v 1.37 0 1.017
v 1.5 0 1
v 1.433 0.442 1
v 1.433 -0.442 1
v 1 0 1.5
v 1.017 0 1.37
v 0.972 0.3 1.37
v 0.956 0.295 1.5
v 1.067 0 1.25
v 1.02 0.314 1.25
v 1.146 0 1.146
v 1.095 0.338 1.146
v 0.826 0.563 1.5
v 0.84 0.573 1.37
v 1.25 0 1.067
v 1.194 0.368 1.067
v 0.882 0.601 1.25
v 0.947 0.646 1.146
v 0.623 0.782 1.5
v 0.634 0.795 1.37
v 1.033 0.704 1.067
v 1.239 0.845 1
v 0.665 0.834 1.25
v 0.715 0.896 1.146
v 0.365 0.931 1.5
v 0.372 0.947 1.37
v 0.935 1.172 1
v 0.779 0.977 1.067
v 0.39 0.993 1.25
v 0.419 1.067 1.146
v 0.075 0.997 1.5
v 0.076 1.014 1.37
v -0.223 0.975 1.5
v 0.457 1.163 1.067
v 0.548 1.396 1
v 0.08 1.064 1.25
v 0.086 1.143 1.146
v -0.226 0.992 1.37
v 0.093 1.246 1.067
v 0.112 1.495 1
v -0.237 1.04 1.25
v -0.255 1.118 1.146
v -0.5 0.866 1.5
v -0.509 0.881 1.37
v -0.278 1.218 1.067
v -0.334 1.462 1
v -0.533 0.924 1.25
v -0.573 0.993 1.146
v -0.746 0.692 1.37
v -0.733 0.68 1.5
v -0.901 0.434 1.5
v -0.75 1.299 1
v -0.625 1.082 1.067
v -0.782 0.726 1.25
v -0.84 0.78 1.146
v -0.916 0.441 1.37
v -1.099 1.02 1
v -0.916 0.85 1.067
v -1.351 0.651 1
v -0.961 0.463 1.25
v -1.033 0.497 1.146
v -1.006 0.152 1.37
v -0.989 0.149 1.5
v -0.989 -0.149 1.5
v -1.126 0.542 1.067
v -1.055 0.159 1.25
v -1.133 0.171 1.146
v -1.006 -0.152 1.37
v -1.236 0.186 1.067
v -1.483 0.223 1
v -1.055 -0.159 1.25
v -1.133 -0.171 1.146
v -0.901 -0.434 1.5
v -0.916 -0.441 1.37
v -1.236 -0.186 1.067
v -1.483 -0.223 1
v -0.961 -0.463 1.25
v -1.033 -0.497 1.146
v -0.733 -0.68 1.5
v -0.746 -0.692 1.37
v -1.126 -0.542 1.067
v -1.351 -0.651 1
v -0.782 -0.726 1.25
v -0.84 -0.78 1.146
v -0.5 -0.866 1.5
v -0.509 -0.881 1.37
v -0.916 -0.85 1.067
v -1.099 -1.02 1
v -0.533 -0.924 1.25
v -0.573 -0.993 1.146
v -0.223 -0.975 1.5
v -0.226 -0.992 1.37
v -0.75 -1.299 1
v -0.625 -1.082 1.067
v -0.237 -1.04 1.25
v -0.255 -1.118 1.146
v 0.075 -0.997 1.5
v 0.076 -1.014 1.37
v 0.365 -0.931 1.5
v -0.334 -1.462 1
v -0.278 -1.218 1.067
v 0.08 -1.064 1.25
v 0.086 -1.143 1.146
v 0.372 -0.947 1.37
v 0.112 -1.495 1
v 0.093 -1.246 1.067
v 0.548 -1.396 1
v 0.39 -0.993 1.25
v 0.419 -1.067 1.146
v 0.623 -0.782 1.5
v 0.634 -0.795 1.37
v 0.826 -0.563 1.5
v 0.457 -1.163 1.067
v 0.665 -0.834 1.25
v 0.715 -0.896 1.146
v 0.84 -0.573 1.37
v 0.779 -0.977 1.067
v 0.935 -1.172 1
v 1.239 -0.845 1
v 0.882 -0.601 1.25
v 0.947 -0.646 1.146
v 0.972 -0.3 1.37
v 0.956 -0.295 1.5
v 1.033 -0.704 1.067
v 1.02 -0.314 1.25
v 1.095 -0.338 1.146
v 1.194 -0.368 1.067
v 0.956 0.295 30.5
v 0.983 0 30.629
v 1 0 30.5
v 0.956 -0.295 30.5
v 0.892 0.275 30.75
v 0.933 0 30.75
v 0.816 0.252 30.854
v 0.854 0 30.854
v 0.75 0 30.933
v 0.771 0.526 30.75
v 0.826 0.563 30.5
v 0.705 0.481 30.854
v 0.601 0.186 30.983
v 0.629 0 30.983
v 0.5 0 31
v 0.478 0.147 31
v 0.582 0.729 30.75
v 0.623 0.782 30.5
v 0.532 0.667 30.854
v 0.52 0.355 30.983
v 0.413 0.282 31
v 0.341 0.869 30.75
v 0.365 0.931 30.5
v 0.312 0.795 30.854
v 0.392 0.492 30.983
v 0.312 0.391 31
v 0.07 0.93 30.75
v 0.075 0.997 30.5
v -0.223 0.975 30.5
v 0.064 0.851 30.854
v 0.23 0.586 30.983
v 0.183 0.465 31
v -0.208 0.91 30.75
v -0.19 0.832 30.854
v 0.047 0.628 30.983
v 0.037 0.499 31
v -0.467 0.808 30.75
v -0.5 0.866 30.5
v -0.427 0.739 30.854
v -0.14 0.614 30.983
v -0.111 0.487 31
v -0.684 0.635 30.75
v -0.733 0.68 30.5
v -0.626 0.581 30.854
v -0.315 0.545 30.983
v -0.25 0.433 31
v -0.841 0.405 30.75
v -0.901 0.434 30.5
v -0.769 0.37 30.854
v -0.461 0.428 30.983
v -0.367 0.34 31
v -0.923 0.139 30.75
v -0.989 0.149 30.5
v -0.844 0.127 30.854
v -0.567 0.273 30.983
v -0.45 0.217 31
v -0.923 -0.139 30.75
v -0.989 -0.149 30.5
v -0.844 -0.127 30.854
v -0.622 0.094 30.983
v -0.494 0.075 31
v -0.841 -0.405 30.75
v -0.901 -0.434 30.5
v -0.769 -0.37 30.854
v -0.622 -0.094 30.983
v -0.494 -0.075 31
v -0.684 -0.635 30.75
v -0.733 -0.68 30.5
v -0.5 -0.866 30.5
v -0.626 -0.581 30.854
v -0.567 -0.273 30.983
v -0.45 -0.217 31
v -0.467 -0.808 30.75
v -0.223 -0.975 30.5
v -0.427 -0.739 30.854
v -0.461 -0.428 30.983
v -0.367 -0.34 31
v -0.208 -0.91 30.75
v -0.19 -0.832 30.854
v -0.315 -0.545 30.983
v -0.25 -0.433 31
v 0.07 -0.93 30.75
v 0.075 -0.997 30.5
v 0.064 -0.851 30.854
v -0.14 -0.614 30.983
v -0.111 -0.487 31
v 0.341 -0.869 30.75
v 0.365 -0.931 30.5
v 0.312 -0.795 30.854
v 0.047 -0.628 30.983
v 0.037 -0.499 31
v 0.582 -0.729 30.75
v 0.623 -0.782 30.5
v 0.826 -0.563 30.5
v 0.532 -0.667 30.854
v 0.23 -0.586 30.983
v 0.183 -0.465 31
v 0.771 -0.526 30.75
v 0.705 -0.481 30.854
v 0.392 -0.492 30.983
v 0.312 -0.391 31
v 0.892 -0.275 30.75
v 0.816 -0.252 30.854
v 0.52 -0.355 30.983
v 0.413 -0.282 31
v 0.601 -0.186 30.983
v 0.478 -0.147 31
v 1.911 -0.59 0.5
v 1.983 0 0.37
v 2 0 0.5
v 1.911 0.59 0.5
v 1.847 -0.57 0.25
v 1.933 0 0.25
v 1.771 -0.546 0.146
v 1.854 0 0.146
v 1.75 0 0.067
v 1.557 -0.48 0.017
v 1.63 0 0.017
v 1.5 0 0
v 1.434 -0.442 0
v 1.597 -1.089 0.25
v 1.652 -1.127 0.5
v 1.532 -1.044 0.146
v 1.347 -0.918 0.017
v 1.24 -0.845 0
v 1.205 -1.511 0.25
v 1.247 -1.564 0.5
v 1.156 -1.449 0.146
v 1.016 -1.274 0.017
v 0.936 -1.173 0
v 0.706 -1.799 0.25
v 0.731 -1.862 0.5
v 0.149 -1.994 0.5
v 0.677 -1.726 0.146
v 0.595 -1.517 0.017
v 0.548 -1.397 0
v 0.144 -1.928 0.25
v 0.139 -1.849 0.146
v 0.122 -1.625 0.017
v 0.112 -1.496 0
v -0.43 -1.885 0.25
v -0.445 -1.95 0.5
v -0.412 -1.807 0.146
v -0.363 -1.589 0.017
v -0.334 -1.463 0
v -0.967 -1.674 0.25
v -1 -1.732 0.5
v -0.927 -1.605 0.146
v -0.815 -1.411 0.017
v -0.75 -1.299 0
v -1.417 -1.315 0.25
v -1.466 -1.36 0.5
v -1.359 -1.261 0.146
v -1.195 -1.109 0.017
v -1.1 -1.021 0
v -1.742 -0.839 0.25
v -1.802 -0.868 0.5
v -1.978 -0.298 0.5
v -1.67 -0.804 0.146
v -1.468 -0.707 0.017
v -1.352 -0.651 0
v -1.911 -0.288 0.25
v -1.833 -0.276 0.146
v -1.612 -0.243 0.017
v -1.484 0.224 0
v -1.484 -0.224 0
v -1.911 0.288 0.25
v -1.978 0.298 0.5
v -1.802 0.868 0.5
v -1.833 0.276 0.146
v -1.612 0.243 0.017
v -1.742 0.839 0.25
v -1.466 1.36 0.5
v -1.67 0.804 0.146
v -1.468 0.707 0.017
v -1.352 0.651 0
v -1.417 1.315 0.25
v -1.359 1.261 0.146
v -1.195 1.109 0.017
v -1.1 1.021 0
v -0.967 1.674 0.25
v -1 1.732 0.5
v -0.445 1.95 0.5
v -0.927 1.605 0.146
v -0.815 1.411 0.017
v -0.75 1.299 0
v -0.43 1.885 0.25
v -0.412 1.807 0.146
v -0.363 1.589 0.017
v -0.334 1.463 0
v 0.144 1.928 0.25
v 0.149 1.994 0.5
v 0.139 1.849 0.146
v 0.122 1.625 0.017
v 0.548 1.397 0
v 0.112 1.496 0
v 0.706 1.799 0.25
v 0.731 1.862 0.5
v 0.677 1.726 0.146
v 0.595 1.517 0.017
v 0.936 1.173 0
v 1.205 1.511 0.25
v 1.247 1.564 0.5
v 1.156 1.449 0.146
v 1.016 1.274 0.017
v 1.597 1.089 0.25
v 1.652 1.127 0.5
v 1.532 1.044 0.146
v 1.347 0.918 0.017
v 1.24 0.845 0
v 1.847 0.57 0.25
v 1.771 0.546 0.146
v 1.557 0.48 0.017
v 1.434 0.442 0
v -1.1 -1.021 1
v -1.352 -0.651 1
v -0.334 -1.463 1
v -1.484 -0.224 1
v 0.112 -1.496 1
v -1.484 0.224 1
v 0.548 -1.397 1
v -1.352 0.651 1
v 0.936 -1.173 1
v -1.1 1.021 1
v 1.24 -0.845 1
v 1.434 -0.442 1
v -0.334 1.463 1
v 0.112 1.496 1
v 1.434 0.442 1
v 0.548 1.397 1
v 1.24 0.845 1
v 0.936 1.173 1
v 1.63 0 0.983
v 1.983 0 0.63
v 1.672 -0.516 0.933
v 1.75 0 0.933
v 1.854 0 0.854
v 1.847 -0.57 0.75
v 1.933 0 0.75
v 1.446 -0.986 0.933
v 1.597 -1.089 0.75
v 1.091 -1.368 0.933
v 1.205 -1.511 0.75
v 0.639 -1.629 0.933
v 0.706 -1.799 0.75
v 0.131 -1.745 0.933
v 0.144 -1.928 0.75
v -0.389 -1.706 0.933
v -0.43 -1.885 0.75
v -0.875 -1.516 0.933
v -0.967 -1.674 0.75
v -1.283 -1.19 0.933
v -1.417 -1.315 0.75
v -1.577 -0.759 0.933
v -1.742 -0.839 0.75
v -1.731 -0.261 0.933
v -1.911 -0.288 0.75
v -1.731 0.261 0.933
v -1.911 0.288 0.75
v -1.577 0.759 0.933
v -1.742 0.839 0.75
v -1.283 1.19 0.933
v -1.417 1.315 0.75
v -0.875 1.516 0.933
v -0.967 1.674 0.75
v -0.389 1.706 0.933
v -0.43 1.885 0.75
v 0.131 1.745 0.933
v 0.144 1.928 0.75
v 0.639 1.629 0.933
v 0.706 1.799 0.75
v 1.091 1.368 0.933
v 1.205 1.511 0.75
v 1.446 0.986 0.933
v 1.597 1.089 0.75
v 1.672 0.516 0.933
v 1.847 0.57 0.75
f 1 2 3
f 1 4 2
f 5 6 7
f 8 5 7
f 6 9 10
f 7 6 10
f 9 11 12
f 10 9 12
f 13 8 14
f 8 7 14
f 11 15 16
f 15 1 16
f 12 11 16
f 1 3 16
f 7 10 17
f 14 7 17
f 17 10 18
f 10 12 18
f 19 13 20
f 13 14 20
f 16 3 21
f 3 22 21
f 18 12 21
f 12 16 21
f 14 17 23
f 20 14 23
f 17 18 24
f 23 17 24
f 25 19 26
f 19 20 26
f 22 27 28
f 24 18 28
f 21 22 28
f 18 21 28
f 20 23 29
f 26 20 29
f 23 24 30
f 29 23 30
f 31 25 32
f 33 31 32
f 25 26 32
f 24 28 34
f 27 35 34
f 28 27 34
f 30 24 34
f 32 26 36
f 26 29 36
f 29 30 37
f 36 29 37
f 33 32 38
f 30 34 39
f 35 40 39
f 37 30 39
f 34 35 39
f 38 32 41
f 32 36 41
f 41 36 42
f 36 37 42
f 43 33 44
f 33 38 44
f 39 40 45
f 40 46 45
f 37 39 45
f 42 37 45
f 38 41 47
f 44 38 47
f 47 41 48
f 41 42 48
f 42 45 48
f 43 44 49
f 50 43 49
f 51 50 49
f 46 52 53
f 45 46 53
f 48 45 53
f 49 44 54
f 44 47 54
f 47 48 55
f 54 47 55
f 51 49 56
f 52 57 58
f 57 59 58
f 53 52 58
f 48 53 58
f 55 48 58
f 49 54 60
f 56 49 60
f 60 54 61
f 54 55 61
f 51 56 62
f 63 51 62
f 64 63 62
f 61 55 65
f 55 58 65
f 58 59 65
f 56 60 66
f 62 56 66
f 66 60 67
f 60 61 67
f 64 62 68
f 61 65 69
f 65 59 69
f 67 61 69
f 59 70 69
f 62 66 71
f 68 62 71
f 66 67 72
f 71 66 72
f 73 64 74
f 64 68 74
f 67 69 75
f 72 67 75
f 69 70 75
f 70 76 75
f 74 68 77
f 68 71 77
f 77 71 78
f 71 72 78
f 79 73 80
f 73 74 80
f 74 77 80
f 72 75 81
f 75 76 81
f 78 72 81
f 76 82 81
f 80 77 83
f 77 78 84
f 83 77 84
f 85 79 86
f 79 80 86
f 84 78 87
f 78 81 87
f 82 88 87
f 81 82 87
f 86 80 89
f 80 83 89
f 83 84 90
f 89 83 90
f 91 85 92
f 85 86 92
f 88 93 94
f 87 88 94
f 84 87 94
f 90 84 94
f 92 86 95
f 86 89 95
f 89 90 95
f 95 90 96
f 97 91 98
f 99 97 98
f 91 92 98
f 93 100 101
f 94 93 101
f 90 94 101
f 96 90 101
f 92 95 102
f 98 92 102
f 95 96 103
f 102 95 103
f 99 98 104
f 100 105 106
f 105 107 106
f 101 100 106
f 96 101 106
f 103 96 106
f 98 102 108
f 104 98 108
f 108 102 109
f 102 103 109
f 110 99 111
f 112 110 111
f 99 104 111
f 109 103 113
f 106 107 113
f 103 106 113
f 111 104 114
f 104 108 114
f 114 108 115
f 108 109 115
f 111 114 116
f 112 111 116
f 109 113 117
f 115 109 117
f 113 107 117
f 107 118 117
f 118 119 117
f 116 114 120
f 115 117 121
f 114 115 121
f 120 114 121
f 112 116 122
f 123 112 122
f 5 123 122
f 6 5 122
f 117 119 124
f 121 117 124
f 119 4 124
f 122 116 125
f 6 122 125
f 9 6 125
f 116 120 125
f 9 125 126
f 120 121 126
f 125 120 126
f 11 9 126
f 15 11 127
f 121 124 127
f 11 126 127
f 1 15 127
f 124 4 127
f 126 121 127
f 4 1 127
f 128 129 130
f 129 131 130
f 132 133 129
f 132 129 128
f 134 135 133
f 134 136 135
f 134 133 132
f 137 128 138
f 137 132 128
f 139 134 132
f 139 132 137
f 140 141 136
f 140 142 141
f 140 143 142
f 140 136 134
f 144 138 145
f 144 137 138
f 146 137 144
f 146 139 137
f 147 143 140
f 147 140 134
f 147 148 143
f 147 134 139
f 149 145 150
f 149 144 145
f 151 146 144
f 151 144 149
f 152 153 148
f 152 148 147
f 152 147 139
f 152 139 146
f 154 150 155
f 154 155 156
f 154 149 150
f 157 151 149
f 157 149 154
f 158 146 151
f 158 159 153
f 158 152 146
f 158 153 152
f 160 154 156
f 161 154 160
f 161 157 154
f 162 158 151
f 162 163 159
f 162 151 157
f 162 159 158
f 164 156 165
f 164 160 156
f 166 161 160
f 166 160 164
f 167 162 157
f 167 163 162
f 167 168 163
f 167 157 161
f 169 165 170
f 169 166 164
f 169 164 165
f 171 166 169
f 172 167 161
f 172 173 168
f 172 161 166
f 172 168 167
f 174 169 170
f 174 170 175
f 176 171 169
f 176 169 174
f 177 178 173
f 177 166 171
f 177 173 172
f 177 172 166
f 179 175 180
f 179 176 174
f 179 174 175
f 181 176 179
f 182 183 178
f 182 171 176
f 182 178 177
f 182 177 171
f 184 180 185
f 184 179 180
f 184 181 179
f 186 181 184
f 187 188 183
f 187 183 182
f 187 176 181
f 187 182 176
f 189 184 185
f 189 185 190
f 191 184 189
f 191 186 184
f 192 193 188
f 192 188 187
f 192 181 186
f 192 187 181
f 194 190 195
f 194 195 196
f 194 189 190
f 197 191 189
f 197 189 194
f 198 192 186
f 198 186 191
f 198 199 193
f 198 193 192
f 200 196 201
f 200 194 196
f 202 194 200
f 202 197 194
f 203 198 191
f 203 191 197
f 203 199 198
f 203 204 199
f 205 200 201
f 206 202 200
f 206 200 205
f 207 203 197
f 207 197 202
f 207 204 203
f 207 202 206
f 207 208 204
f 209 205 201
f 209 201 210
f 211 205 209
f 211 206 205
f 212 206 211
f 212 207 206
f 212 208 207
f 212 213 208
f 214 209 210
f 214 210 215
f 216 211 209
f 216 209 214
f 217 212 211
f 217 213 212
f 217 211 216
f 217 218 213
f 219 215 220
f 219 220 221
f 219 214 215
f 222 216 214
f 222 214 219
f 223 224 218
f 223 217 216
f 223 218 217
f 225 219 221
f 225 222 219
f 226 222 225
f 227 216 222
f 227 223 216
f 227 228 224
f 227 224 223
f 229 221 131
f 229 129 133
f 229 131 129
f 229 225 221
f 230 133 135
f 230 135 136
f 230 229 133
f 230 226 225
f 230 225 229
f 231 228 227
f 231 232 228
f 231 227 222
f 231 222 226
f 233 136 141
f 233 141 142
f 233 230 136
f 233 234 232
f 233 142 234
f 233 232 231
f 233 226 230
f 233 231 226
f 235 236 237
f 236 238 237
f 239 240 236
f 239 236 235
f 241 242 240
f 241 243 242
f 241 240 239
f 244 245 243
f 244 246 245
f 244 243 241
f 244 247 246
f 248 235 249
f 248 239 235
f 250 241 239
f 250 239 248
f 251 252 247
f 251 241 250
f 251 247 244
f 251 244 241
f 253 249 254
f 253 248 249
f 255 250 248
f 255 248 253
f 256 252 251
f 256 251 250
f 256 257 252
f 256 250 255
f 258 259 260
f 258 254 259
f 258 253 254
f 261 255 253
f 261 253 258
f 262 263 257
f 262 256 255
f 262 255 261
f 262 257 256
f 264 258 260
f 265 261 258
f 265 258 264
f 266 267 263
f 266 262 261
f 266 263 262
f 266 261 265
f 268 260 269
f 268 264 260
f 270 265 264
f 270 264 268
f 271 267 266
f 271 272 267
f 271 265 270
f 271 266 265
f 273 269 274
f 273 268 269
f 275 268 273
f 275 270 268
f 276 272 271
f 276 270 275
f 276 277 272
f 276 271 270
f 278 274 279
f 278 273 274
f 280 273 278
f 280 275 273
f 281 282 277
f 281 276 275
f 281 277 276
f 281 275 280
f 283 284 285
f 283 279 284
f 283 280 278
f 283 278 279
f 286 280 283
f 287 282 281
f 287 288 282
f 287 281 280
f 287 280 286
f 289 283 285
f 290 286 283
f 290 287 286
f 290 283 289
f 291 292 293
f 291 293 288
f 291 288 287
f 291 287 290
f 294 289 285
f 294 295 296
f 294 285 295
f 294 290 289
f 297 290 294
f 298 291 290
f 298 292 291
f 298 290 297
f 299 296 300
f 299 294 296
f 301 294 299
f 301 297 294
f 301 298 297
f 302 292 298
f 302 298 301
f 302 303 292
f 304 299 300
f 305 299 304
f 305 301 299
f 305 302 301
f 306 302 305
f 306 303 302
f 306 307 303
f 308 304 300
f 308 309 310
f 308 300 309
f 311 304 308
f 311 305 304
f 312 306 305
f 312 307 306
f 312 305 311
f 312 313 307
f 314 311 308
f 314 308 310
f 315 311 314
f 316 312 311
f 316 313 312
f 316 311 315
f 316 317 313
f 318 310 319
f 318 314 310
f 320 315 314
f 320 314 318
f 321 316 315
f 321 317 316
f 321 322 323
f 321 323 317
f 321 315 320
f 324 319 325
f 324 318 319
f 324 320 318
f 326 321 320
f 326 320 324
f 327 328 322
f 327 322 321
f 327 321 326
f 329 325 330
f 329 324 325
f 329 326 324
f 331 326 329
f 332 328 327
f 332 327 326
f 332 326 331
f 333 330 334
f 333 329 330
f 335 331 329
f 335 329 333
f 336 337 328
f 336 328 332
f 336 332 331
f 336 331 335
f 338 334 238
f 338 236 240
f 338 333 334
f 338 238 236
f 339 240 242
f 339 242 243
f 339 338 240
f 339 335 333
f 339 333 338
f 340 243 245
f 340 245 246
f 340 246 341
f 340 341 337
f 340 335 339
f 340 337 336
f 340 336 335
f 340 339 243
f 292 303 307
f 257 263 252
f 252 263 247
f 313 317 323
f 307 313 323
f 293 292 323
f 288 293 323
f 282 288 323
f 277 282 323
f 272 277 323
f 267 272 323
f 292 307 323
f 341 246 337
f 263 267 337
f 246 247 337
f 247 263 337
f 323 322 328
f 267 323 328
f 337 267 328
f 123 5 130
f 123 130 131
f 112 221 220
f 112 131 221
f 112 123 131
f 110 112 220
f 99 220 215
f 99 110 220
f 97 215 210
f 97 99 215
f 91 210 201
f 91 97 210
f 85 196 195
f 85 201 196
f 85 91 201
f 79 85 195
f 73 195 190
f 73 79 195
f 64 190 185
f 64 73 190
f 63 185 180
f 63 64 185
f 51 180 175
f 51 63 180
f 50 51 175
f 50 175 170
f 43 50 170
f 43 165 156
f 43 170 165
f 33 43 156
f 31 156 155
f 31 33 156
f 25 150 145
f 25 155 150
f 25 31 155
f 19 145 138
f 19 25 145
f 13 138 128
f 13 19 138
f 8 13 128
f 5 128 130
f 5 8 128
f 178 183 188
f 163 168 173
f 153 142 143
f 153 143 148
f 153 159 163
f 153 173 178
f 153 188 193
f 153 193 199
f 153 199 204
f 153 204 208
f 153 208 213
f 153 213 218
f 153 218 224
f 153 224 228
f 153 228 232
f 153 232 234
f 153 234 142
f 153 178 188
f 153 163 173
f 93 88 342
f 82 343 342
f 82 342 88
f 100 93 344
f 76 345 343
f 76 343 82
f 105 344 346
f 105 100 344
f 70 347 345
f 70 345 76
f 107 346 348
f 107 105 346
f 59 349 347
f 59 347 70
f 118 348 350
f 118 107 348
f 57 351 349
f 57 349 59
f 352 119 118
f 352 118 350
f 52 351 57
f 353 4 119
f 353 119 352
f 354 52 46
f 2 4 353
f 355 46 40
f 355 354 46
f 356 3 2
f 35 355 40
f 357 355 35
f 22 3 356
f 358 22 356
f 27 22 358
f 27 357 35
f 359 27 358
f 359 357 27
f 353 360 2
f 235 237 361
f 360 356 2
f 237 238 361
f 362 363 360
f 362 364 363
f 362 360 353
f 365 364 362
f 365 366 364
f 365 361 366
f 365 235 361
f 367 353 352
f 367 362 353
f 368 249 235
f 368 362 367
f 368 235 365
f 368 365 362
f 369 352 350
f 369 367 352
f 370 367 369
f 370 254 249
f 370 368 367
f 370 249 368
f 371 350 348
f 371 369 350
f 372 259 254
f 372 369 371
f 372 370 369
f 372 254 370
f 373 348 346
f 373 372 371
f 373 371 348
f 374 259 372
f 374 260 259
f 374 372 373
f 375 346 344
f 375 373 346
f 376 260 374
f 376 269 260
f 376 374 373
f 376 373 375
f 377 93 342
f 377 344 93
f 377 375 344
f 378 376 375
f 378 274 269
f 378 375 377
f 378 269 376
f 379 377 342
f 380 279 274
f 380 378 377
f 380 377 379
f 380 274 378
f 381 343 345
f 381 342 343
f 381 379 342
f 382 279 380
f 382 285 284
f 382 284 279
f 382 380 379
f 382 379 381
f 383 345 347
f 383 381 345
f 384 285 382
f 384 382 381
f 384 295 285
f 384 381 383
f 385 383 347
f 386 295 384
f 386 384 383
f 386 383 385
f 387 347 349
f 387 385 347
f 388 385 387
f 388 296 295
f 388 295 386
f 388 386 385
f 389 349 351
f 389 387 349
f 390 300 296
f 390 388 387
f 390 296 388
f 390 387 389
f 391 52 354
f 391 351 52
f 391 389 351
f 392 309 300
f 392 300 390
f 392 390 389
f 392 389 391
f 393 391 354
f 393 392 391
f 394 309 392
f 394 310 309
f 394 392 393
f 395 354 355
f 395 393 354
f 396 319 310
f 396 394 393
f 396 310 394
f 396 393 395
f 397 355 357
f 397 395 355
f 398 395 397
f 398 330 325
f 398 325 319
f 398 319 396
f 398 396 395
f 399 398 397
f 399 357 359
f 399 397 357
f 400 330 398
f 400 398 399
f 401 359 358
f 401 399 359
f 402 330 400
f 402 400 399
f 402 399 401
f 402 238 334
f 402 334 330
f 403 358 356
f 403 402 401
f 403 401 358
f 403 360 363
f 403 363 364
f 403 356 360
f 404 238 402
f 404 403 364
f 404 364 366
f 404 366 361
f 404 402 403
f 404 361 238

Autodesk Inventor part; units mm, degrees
ref_plane "YZ Plane" through (0, 0, 0) normal (1, 0, 0) x (0, 1, 0)
ref_plane "XZ Plane" through (0, 0, 0) normal (0, 1, 0) x (-1, 0, 0)
ref_plane "XY Plane" through (0, 0, 0) normal (0, 0, 1) x (1, 0, 0)
sketch "Sketch1" plane through (0, 0, 0) normal (0, 0, 1) x (1, 0, 0)
  circle A0 centre (0, 0) radius 2
  dimension "d0" = 4
extrude "Extrusion1" add sketch "Sketch1" along normal blind 1
sketch "Sketch2" plane through (0, 0, 1) normal (0, 0, 1) x (1, 0, 0)
  circle A0 centre (0, 0) radius 1
  dimension "d3" = 2
extrude "Extrusion2" add sketch "Sketch2" along normal blind 30
fillet "Fillet1" radius 0.5 1 edges at (-1, 0, 31)
fillet "Fillet2" radius 0.5 3 edges at (-1, 0, 1) (-2, 0, 1) (-2, 0, 0)
properties part number "ufakpin"
